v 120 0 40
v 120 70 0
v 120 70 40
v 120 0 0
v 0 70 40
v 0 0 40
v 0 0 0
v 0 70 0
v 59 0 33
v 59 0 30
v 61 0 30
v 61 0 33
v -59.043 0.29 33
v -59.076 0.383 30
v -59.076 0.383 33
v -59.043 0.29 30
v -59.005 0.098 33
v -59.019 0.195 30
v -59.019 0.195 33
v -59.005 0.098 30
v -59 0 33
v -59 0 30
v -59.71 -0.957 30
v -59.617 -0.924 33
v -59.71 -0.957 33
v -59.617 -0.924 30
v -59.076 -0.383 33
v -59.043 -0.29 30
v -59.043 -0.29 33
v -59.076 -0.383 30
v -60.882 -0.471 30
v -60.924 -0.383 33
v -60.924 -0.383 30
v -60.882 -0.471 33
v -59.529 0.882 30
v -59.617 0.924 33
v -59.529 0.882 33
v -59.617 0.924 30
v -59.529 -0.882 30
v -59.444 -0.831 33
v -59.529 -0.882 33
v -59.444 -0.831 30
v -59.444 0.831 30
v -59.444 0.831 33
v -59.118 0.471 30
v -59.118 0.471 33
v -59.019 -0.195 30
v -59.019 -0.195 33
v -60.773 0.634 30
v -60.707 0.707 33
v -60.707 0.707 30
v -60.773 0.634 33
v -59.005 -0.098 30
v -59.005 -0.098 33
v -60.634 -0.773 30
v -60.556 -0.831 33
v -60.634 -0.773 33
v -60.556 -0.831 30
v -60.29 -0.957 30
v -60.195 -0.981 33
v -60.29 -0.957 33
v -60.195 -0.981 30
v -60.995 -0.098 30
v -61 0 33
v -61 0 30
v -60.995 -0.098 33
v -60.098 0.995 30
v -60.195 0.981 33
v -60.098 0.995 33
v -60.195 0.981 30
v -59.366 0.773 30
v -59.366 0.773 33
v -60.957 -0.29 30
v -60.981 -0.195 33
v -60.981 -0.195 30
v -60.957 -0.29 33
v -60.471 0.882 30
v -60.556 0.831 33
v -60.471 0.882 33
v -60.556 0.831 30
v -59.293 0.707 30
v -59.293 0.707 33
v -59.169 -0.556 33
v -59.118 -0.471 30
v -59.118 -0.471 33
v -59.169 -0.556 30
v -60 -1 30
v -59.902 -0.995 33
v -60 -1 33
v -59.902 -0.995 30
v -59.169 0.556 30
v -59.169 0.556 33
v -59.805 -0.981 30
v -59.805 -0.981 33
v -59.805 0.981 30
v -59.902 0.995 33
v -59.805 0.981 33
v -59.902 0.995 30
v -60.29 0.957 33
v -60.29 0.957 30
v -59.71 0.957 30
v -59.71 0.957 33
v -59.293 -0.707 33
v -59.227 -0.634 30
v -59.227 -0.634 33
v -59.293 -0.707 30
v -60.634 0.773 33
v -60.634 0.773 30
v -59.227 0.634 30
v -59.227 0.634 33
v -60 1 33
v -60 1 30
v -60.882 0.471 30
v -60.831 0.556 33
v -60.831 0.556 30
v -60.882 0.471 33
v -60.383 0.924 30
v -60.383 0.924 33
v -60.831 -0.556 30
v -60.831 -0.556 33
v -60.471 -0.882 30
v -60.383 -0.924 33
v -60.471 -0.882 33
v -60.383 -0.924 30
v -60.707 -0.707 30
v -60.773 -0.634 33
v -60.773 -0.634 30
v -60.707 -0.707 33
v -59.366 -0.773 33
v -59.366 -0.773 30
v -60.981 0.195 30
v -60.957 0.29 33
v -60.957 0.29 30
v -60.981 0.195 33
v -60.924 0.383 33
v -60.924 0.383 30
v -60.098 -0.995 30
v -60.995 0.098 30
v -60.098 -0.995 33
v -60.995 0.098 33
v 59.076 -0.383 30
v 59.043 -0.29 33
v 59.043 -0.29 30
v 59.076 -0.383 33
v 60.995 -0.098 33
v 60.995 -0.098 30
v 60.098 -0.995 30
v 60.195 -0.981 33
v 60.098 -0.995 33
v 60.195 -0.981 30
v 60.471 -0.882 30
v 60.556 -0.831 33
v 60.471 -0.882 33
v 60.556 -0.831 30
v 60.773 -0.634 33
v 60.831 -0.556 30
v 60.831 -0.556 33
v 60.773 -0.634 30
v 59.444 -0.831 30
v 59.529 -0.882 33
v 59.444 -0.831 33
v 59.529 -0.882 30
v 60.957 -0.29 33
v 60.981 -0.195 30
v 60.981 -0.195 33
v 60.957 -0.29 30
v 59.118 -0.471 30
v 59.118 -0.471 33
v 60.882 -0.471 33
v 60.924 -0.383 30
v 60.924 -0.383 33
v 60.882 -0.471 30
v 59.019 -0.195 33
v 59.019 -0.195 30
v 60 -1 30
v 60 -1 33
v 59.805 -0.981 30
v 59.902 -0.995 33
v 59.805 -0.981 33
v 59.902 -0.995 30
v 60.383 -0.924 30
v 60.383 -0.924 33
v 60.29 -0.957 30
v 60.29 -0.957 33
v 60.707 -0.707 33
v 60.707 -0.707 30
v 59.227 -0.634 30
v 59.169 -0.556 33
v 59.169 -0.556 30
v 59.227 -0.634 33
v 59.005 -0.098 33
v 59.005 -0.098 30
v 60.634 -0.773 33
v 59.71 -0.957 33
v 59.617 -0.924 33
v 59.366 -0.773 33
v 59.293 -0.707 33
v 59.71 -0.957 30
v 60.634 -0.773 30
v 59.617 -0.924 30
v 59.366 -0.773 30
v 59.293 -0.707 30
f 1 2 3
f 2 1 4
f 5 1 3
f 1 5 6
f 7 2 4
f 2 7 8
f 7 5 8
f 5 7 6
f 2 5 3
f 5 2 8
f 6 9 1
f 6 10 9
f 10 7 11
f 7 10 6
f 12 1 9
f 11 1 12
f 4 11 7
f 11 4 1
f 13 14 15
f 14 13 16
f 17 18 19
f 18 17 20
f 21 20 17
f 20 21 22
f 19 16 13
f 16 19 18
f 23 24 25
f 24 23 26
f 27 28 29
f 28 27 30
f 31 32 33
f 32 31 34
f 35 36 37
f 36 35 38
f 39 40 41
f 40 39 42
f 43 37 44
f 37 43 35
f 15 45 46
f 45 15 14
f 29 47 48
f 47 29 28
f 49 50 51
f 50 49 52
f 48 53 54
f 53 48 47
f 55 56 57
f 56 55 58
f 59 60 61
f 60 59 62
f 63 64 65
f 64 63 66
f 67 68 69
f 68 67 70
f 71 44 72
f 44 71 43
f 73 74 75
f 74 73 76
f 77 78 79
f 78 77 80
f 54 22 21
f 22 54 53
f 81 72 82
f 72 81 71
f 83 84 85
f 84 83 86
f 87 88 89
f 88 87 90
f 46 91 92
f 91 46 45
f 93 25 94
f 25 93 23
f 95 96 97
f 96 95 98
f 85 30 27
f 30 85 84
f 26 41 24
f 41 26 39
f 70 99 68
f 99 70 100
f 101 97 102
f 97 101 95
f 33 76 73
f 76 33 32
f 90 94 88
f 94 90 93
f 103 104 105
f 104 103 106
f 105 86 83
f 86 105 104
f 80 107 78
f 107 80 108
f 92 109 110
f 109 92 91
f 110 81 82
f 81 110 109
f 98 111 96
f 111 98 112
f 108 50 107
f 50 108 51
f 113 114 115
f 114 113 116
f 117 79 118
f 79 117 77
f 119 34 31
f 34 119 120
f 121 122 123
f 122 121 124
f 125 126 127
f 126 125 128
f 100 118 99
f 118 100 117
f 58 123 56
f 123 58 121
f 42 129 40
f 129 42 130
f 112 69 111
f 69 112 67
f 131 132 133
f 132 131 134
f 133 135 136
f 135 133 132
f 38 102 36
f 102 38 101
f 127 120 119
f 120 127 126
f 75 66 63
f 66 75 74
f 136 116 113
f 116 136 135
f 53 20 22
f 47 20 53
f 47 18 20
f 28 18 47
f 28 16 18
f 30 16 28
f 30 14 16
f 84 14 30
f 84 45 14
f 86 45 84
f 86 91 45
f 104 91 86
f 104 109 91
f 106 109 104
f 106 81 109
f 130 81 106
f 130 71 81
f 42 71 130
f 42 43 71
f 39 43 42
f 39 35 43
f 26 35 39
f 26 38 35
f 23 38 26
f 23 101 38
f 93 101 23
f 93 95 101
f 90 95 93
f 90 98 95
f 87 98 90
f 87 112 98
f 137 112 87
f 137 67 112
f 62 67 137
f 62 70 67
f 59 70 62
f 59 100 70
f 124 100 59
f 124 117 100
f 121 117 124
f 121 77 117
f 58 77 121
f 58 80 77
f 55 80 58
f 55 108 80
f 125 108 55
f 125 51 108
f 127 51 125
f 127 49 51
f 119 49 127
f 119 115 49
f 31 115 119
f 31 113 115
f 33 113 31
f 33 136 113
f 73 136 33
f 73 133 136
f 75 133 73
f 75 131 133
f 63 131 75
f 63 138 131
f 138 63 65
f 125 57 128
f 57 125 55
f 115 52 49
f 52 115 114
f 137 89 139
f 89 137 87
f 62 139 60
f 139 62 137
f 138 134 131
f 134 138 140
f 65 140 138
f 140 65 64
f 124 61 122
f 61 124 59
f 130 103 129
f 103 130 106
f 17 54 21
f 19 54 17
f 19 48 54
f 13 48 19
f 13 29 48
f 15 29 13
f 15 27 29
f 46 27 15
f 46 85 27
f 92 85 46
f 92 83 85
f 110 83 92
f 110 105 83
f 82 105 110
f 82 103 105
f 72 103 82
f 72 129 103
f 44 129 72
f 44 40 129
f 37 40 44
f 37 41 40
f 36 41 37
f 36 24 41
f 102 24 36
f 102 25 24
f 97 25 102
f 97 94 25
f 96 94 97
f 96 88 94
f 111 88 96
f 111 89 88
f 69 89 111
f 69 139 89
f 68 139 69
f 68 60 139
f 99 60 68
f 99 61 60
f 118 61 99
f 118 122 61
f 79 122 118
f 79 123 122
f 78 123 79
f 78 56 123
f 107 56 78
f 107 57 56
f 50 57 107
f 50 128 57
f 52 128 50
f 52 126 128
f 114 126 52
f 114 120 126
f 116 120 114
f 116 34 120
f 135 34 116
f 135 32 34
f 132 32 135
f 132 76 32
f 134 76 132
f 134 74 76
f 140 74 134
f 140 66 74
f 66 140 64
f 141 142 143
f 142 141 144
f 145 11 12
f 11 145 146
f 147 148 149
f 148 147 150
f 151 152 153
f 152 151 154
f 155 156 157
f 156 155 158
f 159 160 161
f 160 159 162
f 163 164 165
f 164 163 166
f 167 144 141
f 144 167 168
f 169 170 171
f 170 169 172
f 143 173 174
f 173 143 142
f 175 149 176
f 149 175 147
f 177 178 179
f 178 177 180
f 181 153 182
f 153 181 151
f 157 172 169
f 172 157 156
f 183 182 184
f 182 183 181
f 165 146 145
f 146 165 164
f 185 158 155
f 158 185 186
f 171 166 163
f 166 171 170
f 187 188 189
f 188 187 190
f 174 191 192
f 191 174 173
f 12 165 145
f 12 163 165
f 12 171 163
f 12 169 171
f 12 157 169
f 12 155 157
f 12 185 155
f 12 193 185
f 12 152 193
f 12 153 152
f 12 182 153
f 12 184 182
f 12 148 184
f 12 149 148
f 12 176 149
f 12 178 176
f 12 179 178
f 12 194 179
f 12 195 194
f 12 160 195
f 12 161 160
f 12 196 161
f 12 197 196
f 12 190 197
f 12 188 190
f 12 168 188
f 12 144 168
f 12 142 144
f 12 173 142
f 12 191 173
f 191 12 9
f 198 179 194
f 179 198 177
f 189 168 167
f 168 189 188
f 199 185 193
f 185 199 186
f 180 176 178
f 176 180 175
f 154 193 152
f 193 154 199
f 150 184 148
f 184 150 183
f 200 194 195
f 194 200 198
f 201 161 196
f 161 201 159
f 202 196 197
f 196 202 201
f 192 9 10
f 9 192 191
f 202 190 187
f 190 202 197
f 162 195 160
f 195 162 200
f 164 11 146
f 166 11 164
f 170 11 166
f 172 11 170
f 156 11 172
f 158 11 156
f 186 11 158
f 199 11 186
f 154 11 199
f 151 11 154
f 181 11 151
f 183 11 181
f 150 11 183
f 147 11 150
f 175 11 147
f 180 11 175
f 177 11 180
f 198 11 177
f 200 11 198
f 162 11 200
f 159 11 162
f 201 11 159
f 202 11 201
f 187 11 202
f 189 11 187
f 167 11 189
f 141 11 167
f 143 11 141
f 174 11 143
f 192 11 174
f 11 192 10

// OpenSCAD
// Dimensions in millimetres
outer_x = 120;
outer_y = 70;
outer_z = 40;

wall_thickness = 3;
floor_thickness = 3;

platform_length = 60;
platform_width = outer_y;  // spans full Y
platform_height_above_floor = 10;  // top of platform at z = 13 (floor at z = 3)

hole_diameter = 2;
hole_radius = hole_diameter / 2;
hole_y = 0;  // along Y=0 edge
hole_z = 30;  // at z = 30

// Set resolution for smooth curves
$fn = 64;

// Main tank body (outer box with walls and floor)
// Build from z = 0 to z = 40, centered in X and Y at origin (0,0) for symmetry
// The tank is 120 mm X, 70 mm Y, 40 mm Z, with 3 mm walls and 3 mm floor
// So the inner dimensions are:
inner_x = outer_x - 2 * wall_thickness;  // 114 mm
inner_y = outer_y - 2 * wall_thickness;  // 64 mm
inner_z = outer_z - floor_thickness;     // 37 mm

// Platform for gel tray (raised solid in the middle)
// Platform is 60 mm long in X, centered in X (so from X = -30 to +30 relative to center)
// Platform is 70 mm wide (full Y), so spans Y = -35 to +35
// Platform top is at z = 13 (since floor is 3 mm thick → z = 3 is floor top, platform top at z = 13)
// Platform is 3 mm thick (same as wall)

// We'll build everything centered at origin (0,0,0) for symmetry, but ensure bottom is at z = 0

module tank_body() {
    // Outer box: from z = 0 to z = 40
    // X: -60 to +60 (120 mm)
    // Y: -35 to +35 (70 mm)
    // Z: 0 to 40
    cube([outer_x, outer_y, outer_z], center = false);

    // Cut out the inner cavity (to form walls and floor)
    difference() {
        cube([outer_x, outer_y, outer_z], center = false);
        
        // Inner cavity: from z = 0 to z = 37 mm (since floor is 3 mm thick → inner height = 37 mm)
        // X: from -60 to +60 → inner_x = 114 → so from -57 to +57
        // Y: from -35 to +35 → inner_y = 64 → so from -32 to +32
        // Z: from 0 to 37
        translate([
            -inner_x / 2,  // -57
            -inner_y / 2,  // -32
            0
        ]) {
            cube([inner_x, inner_y, inner_z], center = false);
        }
    }
}

// Platform for gel tray (raised solid in the middle)
// Centered in X: from -platform_length/2 to +platform_length/2 → -30 to +30
// Centered in Y: from -35 to +35 (full Y)
// Height: 3 mm thick, sitting on floor at z = 3, so bottom at z = 3, top at z = 13
module platform() {
    translate([
        0,  // centered in X
        0,  // centered in Y
        floor_thickness  // bottom at z = 3
    ]) {
        cube([platform_length, platform_width, wall_thickness], center = false);
    }
}

// Horizontal holes through end walls (X=±60) at y=0, z=30
// The hole is drilled through the end wall (in X direction), so:
// - Left hole: at X = -60 (left face of tank), Y = 0, Z = 30
// - Right hole: at X = +60 (right face of tank), Y = 0, Z = 30
// The wall is 3 mm thick → so the hole is a cylinder of length 3 mm (in X direction), drilled from the outer face inward
// We drill from X = -60 to X = -57 (in +X direction) for the left hole
// Similarly, from X = +60 to X = +57 for the right hole

module electrode_holes() {
    // Left hole: at X = -60 (left wall face), Y = 0, Z = 30
    // Drill from X = -60 to X = -57 (3 mm inward)
    translate([
        -60,  // X = -60 (left face)
        0,    // Y = 0
        hole_z  // Z = 30
    ]) {
        cylinder(h = wall_thickness, r = hole_radius, center = false, $fn = 64);
    }

    // Right hole: at X = +60 (right wall face), Y = 0, Z = 30
    // Drill from X = +60 to X = +57 (3 mm inward)
    translate([
        60,   // X = +60 (right face)
        0,    // Y = 0
        hole_z  // Z = 30
    ]) {
        cylinder(h = wall_thickness, r = hole_radius, center = false, $fn = 64);
    }
}

// Assemble the complete buffer tank, with base at z = 0 and centered in X and Y
// All parts are built from z = 0 to z = 40, with bottom at z = 0
// The tank is 120 mm X, 70 mm Y, 40 mm Z, walls 3 mm, floor 3 mm
// Platform is 60 mm X, centered, 3 mm thick, top at z = 13
// Holes at X = ±60, Y = 0, Z = 30, 2 mm diameter, drilled 3 mm into tank

tank_body();
platform();
electrode_holes();
